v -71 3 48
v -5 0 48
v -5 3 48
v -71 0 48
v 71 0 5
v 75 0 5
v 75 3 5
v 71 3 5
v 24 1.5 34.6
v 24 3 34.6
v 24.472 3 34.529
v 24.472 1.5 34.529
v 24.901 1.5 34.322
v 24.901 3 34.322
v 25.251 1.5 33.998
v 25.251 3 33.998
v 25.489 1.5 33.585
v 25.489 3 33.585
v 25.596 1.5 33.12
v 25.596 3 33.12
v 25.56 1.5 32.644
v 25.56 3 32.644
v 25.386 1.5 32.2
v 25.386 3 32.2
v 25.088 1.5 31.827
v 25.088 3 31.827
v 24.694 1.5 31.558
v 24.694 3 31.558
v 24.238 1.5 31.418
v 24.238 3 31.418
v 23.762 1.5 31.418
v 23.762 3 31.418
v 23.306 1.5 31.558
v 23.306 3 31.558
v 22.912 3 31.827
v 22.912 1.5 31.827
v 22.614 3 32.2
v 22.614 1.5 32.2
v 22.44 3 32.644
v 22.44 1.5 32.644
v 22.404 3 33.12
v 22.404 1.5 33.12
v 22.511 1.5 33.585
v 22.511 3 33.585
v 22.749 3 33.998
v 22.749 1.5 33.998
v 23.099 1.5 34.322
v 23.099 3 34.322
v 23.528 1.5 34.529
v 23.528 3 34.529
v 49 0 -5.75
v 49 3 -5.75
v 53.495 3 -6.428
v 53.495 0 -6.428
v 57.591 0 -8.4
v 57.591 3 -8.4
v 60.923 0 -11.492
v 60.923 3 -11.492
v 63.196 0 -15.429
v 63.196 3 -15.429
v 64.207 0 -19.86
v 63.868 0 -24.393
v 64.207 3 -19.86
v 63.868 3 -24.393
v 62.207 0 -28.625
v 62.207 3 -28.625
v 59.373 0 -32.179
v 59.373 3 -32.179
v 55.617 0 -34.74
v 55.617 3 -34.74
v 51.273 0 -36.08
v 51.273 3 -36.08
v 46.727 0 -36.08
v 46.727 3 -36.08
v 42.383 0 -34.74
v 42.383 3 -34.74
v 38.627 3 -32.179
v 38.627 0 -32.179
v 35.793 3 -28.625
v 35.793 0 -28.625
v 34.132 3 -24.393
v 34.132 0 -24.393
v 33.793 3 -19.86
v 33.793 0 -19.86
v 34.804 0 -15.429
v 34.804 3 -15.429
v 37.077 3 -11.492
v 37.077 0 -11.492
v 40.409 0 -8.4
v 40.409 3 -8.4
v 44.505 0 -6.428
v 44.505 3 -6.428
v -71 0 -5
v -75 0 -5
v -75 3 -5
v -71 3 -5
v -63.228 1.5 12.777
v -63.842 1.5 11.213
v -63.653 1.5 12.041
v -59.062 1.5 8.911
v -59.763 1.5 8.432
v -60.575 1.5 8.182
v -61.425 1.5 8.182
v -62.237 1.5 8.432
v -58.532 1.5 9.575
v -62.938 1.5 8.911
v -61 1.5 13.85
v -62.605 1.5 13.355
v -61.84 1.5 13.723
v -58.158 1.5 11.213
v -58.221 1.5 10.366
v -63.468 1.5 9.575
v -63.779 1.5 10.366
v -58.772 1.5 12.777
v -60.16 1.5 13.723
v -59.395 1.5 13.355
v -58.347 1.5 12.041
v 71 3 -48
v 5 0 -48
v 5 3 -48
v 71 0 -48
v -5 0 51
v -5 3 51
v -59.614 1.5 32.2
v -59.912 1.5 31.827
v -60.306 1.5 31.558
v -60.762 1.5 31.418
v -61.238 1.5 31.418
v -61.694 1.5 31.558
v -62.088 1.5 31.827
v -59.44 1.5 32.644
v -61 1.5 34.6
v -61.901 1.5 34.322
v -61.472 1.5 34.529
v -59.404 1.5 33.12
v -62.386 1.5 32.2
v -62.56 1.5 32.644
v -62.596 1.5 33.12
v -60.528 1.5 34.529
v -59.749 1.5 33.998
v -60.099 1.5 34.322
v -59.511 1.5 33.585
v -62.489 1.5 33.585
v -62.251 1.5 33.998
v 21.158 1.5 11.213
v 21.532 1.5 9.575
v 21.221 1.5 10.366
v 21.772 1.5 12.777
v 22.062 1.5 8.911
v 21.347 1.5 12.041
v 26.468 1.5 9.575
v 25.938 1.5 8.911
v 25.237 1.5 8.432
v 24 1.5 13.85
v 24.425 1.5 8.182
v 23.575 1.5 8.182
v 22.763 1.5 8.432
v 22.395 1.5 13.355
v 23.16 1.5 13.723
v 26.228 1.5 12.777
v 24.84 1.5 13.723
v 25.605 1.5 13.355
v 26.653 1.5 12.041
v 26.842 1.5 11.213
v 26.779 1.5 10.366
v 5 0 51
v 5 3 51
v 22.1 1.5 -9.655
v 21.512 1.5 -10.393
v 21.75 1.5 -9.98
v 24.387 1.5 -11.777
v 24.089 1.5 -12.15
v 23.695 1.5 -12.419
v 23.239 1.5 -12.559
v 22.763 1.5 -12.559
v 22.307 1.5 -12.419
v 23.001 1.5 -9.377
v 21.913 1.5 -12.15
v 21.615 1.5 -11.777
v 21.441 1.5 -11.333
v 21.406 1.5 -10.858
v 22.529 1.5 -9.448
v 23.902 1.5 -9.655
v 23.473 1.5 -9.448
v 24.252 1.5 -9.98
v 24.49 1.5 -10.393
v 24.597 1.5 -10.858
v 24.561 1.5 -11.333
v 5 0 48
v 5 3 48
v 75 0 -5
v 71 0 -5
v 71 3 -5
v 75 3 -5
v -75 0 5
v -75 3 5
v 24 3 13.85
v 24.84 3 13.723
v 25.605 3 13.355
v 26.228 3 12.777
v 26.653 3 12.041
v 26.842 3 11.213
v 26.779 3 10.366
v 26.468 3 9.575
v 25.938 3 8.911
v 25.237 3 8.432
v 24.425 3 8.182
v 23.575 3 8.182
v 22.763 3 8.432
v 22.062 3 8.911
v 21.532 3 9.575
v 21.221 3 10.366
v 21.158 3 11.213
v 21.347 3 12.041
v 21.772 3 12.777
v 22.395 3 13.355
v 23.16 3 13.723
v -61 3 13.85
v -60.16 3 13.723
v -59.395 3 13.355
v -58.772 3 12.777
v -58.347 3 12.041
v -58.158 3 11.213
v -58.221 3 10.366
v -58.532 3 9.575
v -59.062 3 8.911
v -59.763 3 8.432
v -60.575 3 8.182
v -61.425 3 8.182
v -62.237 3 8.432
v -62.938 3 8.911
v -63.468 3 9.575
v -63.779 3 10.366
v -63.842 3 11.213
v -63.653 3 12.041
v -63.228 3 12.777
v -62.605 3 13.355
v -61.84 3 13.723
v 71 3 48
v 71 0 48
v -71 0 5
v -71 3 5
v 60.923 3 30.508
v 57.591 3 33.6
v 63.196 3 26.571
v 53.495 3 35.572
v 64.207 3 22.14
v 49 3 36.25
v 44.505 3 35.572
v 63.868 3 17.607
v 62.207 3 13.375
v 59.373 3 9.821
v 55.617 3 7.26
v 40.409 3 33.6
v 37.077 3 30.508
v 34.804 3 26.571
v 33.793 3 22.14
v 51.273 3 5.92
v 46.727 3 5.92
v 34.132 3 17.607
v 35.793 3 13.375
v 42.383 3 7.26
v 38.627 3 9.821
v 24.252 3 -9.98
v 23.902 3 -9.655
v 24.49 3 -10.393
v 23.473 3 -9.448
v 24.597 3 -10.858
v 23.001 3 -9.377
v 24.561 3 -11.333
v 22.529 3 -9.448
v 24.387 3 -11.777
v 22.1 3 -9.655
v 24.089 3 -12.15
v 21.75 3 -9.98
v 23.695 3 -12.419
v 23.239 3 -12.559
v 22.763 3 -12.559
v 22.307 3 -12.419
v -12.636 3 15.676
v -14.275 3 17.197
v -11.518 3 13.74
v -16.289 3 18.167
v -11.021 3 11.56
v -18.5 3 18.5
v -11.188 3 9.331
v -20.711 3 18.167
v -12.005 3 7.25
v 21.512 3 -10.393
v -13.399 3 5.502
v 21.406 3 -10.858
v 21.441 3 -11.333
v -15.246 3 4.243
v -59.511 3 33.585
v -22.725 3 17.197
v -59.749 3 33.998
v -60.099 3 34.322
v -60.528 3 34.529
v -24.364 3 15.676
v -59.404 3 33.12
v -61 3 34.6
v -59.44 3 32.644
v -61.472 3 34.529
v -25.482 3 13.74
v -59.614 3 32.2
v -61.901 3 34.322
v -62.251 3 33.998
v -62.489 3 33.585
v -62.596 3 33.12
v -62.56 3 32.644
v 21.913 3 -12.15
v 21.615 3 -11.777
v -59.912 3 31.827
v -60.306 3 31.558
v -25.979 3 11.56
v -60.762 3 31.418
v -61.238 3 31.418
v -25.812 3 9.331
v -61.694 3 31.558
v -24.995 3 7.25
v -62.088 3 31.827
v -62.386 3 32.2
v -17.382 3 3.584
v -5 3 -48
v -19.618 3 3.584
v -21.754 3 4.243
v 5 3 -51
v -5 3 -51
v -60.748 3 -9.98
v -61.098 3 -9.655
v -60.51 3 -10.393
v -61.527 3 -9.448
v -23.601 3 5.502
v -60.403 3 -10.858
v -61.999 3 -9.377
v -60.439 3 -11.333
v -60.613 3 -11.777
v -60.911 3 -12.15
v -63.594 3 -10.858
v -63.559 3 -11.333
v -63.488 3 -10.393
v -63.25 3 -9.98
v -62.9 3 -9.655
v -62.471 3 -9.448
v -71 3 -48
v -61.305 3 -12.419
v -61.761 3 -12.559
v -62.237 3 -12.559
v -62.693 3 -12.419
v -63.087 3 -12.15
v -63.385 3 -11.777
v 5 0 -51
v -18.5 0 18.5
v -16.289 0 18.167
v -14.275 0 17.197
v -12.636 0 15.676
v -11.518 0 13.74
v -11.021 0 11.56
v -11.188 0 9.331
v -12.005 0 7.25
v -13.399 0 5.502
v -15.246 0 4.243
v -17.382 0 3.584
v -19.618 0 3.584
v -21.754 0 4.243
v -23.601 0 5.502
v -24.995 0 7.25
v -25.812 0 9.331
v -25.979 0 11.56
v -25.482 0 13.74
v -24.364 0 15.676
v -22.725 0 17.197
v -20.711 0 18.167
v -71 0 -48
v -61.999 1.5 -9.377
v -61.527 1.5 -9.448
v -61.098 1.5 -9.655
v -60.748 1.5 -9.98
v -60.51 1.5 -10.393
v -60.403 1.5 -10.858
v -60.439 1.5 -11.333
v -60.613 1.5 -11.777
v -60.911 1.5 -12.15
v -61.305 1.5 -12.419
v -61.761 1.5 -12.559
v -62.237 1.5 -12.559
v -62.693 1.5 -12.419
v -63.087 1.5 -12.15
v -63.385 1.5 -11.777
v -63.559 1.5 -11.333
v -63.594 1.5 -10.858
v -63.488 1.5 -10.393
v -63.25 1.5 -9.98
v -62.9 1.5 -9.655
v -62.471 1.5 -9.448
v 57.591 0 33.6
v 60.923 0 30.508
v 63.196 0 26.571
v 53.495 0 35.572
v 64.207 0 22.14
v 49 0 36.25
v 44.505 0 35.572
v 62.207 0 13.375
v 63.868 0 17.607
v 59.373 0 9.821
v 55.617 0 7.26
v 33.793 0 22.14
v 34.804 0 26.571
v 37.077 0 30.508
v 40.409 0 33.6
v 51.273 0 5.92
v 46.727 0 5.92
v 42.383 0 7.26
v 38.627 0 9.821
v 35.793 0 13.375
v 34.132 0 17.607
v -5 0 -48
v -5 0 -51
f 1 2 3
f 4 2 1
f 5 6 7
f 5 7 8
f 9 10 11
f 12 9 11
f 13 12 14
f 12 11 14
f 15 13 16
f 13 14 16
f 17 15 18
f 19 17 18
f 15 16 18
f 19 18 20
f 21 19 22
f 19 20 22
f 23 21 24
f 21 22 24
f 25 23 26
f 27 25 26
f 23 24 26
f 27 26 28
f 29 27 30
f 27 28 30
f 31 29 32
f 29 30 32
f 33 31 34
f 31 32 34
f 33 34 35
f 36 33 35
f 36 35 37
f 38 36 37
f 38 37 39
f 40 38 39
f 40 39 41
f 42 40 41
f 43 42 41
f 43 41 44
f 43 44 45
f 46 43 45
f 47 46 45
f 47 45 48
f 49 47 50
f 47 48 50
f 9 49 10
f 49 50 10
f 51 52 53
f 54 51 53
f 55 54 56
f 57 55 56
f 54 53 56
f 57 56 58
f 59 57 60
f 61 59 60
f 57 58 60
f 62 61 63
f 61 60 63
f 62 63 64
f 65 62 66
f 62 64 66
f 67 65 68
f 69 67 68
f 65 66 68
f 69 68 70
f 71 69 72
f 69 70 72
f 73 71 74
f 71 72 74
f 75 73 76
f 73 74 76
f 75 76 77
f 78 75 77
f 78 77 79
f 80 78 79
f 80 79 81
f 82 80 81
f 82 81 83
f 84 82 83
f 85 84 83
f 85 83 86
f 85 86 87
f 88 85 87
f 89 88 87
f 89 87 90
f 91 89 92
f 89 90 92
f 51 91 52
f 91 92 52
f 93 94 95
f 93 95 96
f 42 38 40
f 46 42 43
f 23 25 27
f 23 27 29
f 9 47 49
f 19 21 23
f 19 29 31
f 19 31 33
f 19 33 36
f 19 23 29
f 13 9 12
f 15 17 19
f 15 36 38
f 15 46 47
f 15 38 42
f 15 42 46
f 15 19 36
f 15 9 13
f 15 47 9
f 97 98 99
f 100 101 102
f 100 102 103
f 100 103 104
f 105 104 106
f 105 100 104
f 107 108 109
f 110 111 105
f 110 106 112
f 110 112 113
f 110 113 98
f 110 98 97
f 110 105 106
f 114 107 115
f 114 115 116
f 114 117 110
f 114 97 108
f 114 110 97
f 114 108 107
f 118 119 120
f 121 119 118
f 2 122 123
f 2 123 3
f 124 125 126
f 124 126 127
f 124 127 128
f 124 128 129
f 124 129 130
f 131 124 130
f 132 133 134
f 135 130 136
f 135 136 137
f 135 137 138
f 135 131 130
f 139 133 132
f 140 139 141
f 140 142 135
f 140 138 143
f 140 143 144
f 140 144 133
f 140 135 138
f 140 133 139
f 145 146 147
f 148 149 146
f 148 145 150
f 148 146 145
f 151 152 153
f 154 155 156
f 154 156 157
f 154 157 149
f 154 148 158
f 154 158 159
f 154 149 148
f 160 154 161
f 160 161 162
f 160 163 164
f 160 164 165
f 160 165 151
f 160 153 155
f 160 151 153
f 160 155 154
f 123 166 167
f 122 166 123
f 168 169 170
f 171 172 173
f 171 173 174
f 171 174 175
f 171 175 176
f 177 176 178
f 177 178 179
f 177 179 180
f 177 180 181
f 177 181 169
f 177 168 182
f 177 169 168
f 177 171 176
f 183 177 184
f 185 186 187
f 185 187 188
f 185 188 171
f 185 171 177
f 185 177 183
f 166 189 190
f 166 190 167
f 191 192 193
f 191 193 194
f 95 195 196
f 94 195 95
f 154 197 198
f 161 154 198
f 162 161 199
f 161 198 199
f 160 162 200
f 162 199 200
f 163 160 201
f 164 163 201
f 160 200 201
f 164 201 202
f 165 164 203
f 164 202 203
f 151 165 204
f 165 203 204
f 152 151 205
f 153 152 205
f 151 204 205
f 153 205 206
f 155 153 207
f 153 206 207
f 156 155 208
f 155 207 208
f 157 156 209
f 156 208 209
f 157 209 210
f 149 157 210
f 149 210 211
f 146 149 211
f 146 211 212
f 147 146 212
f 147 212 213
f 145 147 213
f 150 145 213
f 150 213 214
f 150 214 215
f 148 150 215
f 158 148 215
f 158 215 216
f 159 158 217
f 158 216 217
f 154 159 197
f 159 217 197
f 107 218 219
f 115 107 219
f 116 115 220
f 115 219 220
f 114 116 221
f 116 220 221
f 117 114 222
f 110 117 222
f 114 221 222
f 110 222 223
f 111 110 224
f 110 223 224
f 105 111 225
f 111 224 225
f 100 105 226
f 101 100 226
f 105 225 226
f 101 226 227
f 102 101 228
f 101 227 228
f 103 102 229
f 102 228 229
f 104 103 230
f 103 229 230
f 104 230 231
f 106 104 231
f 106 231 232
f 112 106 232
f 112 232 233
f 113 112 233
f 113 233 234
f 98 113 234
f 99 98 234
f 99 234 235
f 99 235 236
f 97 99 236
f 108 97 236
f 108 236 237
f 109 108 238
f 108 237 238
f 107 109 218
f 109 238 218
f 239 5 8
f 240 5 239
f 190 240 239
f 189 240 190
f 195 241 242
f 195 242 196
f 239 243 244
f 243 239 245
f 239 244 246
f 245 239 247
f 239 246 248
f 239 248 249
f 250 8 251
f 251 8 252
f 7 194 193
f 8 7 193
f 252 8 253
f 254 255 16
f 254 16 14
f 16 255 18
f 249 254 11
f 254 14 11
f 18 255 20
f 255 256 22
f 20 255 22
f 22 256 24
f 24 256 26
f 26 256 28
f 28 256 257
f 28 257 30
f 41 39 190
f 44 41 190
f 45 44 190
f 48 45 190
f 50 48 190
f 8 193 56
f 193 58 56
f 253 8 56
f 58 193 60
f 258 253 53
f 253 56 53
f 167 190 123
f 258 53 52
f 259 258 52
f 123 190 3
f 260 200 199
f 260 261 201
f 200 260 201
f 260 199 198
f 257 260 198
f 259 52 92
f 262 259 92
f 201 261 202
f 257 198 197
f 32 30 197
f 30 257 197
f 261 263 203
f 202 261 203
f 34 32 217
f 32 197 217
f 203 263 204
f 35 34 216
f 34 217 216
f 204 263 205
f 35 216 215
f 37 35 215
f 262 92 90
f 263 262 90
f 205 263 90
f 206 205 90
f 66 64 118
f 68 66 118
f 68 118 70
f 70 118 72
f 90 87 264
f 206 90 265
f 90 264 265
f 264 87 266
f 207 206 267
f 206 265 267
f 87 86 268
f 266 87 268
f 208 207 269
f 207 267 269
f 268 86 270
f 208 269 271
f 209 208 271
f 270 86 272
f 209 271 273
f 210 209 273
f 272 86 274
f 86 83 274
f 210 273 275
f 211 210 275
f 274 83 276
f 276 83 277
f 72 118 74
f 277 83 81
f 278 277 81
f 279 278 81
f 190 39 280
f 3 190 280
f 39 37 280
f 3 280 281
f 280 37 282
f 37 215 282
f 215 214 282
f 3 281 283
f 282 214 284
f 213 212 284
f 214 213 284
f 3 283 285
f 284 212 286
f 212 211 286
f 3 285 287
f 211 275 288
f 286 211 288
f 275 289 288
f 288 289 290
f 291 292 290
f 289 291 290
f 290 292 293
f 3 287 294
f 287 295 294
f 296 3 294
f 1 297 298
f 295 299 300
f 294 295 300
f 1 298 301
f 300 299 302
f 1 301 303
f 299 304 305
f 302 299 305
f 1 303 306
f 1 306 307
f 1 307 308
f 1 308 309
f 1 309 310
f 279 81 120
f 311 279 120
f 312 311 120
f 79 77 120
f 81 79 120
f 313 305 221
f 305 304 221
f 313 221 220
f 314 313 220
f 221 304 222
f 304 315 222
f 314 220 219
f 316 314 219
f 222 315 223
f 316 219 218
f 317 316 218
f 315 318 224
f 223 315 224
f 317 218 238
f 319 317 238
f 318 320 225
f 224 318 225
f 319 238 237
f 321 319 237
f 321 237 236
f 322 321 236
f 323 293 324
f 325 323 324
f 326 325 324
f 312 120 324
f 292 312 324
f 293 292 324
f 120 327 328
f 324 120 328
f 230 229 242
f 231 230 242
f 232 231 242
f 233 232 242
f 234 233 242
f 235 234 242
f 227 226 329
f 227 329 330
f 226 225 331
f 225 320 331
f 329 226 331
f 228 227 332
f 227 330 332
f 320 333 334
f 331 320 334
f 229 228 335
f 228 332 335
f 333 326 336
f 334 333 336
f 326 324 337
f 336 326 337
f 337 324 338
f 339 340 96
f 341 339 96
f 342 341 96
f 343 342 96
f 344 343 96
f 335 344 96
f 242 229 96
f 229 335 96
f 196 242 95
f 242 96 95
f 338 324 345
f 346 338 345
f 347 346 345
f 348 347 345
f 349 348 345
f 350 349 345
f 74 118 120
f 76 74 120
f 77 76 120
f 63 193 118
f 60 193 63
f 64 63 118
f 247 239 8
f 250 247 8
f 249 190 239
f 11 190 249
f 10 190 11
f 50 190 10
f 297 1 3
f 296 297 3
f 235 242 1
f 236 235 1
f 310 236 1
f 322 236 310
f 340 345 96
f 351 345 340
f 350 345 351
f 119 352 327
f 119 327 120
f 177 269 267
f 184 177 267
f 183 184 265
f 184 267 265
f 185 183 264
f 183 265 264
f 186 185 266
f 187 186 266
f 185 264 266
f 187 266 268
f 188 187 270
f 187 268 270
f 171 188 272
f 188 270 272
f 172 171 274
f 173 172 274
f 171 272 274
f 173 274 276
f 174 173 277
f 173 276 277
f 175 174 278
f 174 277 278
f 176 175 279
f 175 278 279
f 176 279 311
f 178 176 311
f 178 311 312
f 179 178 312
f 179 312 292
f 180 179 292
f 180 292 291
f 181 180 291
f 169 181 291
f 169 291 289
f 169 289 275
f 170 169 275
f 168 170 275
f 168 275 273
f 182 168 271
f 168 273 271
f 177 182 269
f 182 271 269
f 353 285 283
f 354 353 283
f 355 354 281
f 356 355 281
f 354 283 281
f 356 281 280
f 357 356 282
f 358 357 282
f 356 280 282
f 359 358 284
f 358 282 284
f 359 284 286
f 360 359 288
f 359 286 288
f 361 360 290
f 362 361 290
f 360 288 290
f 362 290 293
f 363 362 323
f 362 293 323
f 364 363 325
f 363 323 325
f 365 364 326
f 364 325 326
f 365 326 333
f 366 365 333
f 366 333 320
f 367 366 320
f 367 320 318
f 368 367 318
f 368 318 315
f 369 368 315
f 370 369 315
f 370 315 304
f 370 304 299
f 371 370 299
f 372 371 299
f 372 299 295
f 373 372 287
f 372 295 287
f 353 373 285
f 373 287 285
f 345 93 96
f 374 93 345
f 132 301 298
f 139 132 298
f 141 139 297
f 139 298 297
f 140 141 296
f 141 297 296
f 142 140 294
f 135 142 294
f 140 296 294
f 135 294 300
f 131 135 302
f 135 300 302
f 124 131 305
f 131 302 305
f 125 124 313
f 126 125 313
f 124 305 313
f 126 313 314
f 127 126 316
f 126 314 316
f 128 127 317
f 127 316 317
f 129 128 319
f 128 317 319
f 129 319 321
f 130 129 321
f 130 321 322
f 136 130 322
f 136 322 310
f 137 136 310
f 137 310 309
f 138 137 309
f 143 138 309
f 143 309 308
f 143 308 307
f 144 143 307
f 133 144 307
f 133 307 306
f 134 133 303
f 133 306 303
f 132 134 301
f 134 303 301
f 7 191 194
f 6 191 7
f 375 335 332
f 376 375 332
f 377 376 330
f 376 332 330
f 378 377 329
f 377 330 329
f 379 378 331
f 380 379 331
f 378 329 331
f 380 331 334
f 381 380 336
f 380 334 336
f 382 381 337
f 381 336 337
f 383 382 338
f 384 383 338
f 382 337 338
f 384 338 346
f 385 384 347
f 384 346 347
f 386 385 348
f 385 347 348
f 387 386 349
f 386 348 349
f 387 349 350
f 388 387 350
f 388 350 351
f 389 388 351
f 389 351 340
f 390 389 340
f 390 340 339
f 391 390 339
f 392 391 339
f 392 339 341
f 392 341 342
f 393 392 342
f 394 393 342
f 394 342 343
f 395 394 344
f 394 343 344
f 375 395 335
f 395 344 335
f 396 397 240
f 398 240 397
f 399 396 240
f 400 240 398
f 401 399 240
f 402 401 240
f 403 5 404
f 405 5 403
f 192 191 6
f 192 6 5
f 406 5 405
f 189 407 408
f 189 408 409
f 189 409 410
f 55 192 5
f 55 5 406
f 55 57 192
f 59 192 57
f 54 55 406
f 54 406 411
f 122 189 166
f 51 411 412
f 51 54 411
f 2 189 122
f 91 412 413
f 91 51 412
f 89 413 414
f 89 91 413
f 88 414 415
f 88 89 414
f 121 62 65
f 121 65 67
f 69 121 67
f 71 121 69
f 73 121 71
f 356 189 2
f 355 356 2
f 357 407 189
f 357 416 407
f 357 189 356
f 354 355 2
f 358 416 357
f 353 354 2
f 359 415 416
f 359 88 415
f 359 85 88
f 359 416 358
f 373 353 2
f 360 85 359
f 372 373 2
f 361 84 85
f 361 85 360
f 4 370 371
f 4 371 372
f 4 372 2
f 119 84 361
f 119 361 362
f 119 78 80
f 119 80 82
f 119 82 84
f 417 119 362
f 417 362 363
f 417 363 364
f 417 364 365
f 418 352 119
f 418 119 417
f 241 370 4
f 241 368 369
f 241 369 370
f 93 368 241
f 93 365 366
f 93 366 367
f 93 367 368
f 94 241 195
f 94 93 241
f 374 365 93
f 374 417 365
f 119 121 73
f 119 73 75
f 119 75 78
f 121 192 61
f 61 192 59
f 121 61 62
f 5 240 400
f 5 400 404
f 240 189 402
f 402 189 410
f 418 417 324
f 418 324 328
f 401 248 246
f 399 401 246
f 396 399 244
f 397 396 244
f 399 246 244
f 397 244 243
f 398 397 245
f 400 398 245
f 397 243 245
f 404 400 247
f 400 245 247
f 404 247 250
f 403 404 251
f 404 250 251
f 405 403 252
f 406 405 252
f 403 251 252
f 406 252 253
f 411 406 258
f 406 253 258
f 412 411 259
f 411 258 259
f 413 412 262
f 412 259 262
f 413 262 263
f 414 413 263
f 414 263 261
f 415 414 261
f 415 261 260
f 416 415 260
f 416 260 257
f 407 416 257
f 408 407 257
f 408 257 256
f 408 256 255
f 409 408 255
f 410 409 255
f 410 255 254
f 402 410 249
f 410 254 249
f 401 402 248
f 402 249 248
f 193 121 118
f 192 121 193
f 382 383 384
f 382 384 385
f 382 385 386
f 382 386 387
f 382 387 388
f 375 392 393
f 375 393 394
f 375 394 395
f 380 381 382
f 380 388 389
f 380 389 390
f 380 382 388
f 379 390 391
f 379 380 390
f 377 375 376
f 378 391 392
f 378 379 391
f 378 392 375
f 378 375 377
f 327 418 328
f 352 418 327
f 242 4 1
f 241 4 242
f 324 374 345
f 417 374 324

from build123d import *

# Parameters (mm, degrees)
EXTRUDE_1_DEPTH     = 3
SKETCH_2_R          = 1.6
SKETCH_2_R_2        = 2.85
CUT_EXTRUDE_3_DEPTH = 1.5
SKETCH_3_R          = 7.5
SKETCH_3_R_2        = 15.25
CUT_EXTRUDE_4_DEPTH = 3


with BuildPart() as part:
    # 草图1 → 凸台-拉伸1 (new body)
    with BuildSketch(Plane(origin=(0, 0, 0), x_dir=(1, 0, 0), z_dir=(0, 1, 0))):
        Polygon((5, 48), (71, 48), (71, 5), (75, 5), (75, -5), (71, -5), (71, -48), (5, -48), (5, -51), (-5, -51), (-5, -48), (-71, -48), (-71, -5), (-75, -5), (-75, 5), (-71, 5), (-71, 48), (-5, 48), (-5, 51), (5, 51), align=None)
    extrude(amount=EXTRUDE_1_DEPTH)

    # 草图2 → 切除-拉伸3 (cut)
    with BuildSketch(Plane(origin=(0, 3, 0), x_dir=(1, 0, 0), z_dir=(0, 1, 0))):
        with Locations(Location((-61, -33, 0), (0, 0, 270))):
            Circle(SKETCH_2_R)
        with Locations(Location((24, -33, 0), (0, 0, 270))):
            Circle(SKETCH_2_R)
        with Locations(Location((-61, -11, 0), (0, 0, 270))):
            Circle(SKETCH_2_R_2)
        with Locations(Location((24, -11, 0), (0, 0, 270))):
            Circle(SKETCH_2_R_2)
        with Locations(Location((-61.99896854, 10.977307885, 0), (0, 0, 270))):
            Circle(SKETCH_2_R)
        with Locations(Location((23.00103146, 10.977307885, 0), (0, 0, 270))):
            Circle(SKETCH_2_R)
    extrude(amount=-CUT_EXTRUDE_3_DEPTH, mode=Mode.SUBTRACT)

    # 草图3 → 切除-拉伸4 (cut)
    with BuildSketch(Plane(origin=(0, 3, 0), x_dir=(1, 0, 0), z_dir=(0, 1, 0))):
        with Locations(Location((-18.5, -11, 0), (0, 0, 270))):
            Circle(SKETCH_3_R)
        with Locations(Location((49, -21, 0), (0, 0, 270))):
            Circle(SKETCH_3_R_2)
        with Locations(Location((49, 21, 0), (0, 0, 270))):
            Circle(SKETCH_3_R_2)
    extrude(amount=-CUT_EXTRUDE_4_DEPTH, mode=Mode.SUBTRACT)


solid = part.part
